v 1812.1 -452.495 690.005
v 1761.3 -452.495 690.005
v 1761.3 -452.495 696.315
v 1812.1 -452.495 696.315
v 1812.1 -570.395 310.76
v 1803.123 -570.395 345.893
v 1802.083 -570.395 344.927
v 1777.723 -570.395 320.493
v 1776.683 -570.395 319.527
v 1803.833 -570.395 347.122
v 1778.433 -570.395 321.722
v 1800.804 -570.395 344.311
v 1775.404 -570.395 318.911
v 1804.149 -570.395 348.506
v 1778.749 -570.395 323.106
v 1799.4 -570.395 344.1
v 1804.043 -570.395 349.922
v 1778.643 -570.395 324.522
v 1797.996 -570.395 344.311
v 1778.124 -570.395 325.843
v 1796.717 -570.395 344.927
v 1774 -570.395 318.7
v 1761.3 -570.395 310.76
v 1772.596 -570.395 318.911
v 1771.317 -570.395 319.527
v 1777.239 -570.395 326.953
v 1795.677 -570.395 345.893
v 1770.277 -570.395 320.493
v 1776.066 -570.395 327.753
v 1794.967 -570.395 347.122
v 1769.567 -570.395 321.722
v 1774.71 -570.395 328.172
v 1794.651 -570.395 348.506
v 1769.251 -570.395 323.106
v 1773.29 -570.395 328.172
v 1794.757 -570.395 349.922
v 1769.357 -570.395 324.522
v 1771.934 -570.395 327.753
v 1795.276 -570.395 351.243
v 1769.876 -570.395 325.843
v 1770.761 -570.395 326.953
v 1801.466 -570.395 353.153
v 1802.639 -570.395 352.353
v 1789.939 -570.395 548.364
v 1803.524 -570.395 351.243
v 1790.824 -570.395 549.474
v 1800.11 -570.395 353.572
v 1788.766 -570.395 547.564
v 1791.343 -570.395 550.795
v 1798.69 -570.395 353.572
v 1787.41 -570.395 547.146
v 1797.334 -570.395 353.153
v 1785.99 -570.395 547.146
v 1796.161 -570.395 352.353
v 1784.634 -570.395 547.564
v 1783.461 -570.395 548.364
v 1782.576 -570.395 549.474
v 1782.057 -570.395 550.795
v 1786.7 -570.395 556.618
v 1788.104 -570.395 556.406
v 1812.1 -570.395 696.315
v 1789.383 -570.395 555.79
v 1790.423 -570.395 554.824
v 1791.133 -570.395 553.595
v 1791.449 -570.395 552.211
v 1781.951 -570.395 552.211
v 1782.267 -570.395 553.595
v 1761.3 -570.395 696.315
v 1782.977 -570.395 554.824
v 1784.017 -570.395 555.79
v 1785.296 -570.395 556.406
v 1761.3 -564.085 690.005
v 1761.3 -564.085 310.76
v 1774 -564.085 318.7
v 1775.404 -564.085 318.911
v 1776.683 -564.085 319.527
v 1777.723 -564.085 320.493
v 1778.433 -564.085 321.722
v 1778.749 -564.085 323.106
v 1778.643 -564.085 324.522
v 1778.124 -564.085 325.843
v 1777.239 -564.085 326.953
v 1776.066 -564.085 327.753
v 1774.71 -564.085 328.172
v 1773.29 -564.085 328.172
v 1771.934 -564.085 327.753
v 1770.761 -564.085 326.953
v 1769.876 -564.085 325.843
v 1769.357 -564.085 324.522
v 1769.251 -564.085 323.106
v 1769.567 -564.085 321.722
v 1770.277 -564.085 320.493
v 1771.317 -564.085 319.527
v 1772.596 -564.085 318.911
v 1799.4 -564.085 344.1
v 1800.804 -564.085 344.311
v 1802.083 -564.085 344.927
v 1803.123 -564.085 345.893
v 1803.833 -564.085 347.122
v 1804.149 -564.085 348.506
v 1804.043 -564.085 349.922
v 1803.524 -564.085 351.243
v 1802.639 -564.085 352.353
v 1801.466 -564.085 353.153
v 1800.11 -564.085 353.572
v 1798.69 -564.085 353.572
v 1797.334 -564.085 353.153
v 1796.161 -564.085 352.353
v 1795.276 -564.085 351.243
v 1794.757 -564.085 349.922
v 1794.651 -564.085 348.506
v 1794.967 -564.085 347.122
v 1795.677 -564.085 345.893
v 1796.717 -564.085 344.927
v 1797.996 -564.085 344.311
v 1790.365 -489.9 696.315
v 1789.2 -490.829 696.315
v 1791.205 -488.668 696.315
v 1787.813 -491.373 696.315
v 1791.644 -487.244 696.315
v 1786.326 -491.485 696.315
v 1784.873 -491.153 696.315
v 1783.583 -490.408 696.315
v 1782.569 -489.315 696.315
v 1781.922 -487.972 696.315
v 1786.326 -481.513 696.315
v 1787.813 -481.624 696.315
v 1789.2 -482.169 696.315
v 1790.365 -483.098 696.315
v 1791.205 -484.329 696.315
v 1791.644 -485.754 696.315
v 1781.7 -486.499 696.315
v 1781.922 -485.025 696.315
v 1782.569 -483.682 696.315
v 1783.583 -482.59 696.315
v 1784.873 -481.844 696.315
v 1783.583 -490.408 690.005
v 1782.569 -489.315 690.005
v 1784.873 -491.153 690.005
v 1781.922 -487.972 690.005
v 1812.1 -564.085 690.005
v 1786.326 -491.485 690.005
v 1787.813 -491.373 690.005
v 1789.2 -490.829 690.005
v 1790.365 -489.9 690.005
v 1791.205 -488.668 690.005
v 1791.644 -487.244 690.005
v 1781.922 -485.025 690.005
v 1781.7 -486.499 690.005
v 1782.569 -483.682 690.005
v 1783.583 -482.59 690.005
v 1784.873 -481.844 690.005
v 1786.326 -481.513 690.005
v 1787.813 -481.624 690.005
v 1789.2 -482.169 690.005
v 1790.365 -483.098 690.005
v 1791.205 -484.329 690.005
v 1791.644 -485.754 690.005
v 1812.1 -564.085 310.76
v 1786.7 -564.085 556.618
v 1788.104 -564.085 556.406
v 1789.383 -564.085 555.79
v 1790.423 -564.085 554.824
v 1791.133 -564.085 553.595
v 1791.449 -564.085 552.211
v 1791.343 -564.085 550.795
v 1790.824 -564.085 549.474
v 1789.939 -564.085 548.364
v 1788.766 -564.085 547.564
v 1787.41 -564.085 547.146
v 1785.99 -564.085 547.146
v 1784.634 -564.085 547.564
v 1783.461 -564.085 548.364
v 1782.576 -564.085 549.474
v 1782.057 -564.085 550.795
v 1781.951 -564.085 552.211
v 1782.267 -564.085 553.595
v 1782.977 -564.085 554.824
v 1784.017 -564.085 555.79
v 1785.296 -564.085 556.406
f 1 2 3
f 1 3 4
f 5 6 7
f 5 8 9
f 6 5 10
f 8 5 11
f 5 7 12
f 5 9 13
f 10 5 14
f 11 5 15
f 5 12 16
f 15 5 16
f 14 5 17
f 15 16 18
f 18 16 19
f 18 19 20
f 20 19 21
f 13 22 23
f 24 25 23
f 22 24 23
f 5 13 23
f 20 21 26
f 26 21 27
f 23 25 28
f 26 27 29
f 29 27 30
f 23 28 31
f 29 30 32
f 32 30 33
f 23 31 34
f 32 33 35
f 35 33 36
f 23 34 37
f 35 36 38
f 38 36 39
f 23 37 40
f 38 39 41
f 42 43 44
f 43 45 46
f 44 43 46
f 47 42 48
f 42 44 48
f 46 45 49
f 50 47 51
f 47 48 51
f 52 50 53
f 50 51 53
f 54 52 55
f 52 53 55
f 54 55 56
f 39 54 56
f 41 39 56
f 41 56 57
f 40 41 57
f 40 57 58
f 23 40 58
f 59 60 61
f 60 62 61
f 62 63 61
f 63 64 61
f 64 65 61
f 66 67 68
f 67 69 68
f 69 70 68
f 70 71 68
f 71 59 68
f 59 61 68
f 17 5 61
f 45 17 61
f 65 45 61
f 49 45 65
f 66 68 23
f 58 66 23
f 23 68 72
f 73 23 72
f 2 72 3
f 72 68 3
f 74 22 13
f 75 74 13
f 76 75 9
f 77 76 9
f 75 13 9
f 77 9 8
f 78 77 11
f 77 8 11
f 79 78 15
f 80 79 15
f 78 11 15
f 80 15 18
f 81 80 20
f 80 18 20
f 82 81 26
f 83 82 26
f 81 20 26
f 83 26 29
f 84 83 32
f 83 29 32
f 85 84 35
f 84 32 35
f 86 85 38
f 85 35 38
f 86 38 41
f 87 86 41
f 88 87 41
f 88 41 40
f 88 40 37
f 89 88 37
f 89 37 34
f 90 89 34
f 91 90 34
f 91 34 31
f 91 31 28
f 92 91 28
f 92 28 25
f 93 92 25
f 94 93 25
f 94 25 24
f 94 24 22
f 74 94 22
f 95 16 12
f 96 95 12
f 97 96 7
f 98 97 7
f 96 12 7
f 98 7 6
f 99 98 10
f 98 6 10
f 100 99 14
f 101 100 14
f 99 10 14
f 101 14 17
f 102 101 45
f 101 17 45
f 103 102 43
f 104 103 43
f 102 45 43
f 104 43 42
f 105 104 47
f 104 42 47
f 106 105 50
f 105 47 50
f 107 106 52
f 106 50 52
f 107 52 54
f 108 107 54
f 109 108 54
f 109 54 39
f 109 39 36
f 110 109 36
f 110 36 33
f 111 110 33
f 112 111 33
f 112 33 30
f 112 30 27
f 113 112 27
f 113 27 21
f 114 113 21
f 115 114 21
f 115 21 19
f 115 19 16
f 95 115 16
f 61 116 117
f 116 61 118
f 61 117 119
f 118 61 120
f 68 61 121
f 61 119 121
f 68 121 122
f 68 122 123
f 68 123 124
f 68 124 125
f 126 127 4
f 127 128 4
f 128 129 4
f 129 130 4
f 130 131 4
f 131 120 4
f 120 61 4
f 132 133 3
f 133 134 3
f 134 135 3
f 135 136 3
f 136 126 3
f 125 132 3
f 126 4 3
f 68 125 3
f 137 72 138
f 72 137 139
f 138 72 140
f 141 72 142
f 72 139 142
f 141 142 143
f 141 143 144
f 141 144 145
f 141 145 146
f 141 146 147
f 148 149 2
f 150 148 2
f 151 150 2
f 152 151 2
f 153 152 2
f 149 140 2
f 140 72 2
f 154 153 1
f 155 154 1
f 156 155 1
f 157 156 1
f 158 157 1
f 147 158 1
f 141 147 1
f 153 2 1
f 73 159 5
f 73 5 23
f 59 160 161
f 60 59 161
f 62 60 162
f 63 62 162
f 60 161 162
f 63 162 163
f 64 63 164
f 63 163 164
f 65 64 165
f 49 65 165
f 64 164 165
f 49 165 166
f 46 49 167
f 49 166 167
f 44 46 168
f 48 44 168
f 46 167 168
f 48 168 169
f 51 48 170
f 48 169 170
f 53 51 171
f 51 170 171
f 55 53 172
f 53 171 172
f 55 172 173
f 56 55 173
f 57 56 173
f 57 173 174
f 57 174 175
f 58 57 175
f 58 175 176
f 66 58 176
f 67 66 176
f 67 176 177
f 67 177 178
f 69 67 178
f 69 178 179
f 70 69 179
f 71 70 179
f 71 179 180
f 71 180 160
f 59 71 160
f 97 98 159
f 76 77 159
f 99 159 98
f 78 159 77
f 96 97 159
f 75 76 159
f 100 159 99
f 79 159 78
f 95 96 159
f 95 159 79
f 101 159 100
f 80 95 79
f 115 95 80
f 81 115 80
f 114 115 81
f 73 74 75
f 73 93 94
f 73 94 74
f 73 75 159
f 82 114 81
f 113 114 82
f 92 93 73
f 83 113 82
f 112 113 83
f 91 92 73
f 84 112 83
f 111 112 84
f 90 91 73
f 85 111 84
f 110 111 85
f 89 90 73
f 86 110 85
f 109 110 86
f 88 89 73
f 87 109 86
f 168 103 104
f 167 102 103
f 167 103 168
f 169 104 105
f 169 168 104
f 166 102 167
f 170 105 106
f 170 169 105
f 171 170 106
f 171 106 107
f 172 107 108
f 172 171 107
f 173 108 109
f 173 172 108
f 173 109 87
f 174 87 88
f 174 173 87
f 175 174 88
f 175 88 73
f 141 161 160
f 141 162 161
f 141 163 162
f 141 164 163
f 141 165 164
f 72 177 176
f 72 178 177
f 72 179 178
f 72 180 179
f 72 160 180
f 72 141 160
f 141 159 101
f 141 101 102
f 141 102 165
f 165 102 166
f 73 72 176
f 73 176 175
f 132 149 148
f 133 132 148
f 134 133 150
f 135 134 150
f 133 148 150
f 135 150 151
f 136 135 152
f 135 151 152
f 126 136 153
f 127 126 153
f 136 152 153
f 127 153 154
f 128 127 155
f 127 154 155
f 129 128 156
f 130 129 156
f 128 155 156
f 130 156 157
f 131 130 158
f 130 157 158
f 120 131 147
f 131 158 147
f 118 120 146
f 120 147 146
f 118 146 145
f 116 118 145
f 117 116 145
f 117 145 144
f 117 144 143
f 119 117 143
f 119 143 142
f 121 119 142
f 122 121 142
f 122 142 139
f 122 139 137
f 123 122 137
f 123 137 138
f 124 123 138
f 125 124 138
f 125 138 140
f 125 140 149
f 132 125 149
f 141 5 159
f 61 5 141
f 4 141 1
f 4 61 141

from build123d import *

# Parameters (mm, degrees)
CROQUIS2_W              = 50.8
CROQUIS2_H              = 6.31
CROQUIS3_W              = 50.8
CROQUIS3_H              = 6.31
CROQUIS4_W              = 60
CROQUIS4_H              = 53.155
SALIENTE_EXTRUIR1_DEPTH = 6.31
CROQUIS5_W              = 60
CROQUIS5_H              = 6.31
CORTAR_EXTRUIR1_DEPTH   = 6.31
CORTAR_EXTRUIR2_DEPTH   = 634
CROQUIS8_W              = 50.8
CROQUIS8_H              = 6.31
SALIENTE_EXTRUIR2_DEPTH = 63.5
CROQUIS9_R              = 5
CORTAR_EXTRUIR3_DEPTH   = 10
CROQUIS10_W             = 790.847933
CROQUIS10_H             = 6.31
CORTAR_EXTRUIR4_DEPTH   = 286
CROQUIS11_W             = 50.8
CROQUIS11_H             = 6.31
CROQUIS11_W_2           = 210
CORTAR_EXTRUIR5_DEPTH   = 13.11
CROQUIS12_W             = 50.8
CROQUIS12_H             = 6.31
SALIENTE_EXTRUIR3_DEPTH = 6.35
CROQUIS13_W             = 50.8
CROQUIS13_H             = 6.35
CORTAR_EXTRUIR6_DEPTH   = 6.35
CROQUIS14_W             = 260.8
CROQUIS14_H             = 6.31
CORTAR_EXTRUIR7_DEPTH   = 6.31
CROQUIS15_W             = 50.8
CROQUIS15_H             = 6.31
CORTAR_EXTRUIR8_DEPTH   = 6.31
CROQUIS16_W             = 78.776397836
CROQUIS16_H             = 454.479218284
CORTAR_EXTRUIR9_DEPTH   = 128
CROQUIS22_R             = 4.7625
CORTAR_EXTRUIR15_DEPTH  = 33
CROQUIS24_R             = 5.000000022
CORTAR_EXTRUIR18_DEPTH  = 33
CROQUIS25_R             = 4.7625
CORTAR_EXTRUIR19_DEPTH  = 50


with BuildPart() as part:
    # Barrer1: sweep along a curve in space
    with BuildLine() as barrer1_path:
        Line((0, 0, 0), (0, -567.24, 0))
        Line((0, -567.24, 0), (0, -567.24, 336.2))
        Line((0, -567.24, 336.2), (1786.7, -567.24, 336.2))
        Line((1786.7, -567.24, 336.2), (1786.7, -567.24, 693.16))
        Line((1786.7, -567.24, 693.16), (1786.7, -436.23, 693.16))
        Line((1786.7, -436.23, 693.16), (1786.7, -436.23, 1487.162933))
    # Croquis2 → Barrer1 (sweep)
    with BuildSketch(Plane(origin=(0, 0, 0), x_dir=(1, 0, 0), z_dir=(0, 1, 0))):
        Rectangle(CROQUIS2_W, CROQUIS2_H)
        with Locations((210, 0)):
            Rectangle(CROQUIS2_W, CROQUIS2_H)
    sweep(path=barrer1_path.line, transition=Transition.RIGHT)

    # Barrer4: sweep along a curve in space
    with BuildLine() as barrer4_path:
        Line((-0.201028049, -3.155, -3.155), (-0.201028049, -3.155, -207.155))
        Line((-0.201028049, -3.155, -207.155), (-0.201028049, -53.155, -207.155))
    # Croquis3 → Barrer4 (sweep)
    with BuildSketch(Plane(origin=(0, 0, -3.155), x_dir=(-1, 0, 0), z_dir=(0, 0, -1))):
        with Locations((-210, -3.155)):
            Rectangle(CROQUIS3_W, CROQUIS3_H)
        with Locations((0, -3.155)):
            Rectangle(CROQUIS3_W, CROQUIS3_H)
    sweep(path=barrer4_path.line, transition=Transition.RIGHT)

    # Croquis4 → Saliente-Extruir1 (add)
    with BuildSketch(Plane(origin=(0, 0, -210.31), x_dir=(-1, 0, 0), z_dir=(0, 0, -1))):
        with Locations((-154.6, -26.5775)):
            Rectangle(CROQUIS4_W, CROQUIS4_H)
    extrude(amount=-SALIENTE_EXTRUIR1_DEPTH)

    # Croquis5 → Cortar-Extruir1 (cut)
    with BuildSketch(Plane.XY.offset(-204)):
        with Locations((154.6, -3.155)):
            Rectangle(CROQUIS5_W, CROQUIS5_H)
    extrude(amount=-CORTAR_EXTRUIR1_DEPTH, mode=Mode.SUBTRACT)

    # Croquis7 → Cortar-Extruir2 (cut)
    with BuildSketch(Plane(origin=(0, 0, 0), x_dir=(1, 0, 0), z_dir=(0, 1, 0))):
        Polygon((1761.3, -361.6), (2022.1, -361.6), (2022.1, 278.600557529), (-188.115947115, 278.600557529), (-188.115947115, -361.6), align=None)
    extrude(amount=-CORTAR_EXTRUIR2_DEPTH, mode=Mode.SUBTRACT)

    # Croquis8 → Saliente-Extruir2 (add)
    with BuildSketch(Plane(origin=(0, 0, 361.6), x_dir=(-1, 0, 0), z_dir=(0, 0, -1))):
        with Locations((-1786.7, -567.24)):
            Rectangle(CROQUIS8_W, CROQUIS8_H)
    extrude(amount=SALIENTE_EXTRUIR2_DEPTH)

    # Croquis9 → Cortar-Extruir3 (cut)
    with BuildSketch(Plane(origin=(0, -433.075, 0), x_dir=(1, 0, 0), z_dir=(0, 1, 0))):
        with Locations(Location((1786.7, -1454.162933, 0), (0, 0, 270))):
            Circle(CROQUIS9_R)
        with Locations(Location((1786.7, -1234.162933, 0), (0, 0, 270))):
            Circle(CROQUIS9_R)
        with Locations(Location((1996.7, -1234.162933, 0), (0, 0, 270))):
            Circle(CROQUIS9_R)
        with Locations(Location((1996.7, -1454.162933, 0), (0, 0, 270))):
            Circle(CROQUIS9_R)
    extrude(amount=-CORTAR_EXTRUIR3_DEPTH, mode=Mode.SUBTRACT)

    # Croquis10 → Cortar-Extruir4 (cut)
    with BuildSketch(Plane(origin=(2022.1, 0, 0), x_dir=(0, 0, -1), z_dir=(1, 0, 0))):
        with Locations((-1091.7389665, -436.23)):
            Rectangle(CROQUIS10_W, CROQUIS10_H)
    extrude(amount=-CORTAR_EXTRUIR4_DEPTH, mode=Mode.SUBTRACT)

    # Croquis11 → Cortar-Extruir5 (cut)
    with BuildSketch(Plane(origin=(0, -433.075, 0), x_dir=(1, 0, 0), z_dir=(0, 1, 0))):
        with Locations((1996.7, -693.16)):
            Rectangle(CROQUIS11_W, CROQUIS11_H)
        with Locations((1866.3, -693.16)):
            Rectangle(CROQUIS11_W_2, CROQUIS11_H)
    extrude(amount=-CORTAR_EXTRUIR5_DEPTH, mode=Mode.SUBTRACT)

    # Croquis12 → Saliente-Extruir3 (add)
    with BuildSketch(Plane(origin=(0, 0, 361.6), x_dir=(-1, 0, 0), z_dir=(0, 0, -1))):
        with Locations((-1996.7, -567.24)):
            Rectangle(CROQUIS12_W, CROQUIS12_H)
    extrude(amount=SALIENTE_EXTRUIR3_DEPTH)

    # Croquis13 → Cortar-Extruir6 (cut)
    with BuildSketch(Plane(origin=(0, -564.085, 0), x_dir=(1, 0, 0), z_dir=(0, 1, 0))):
        with Locations((1786.7, -301.275)):
            Rectangle(CROQUIS13_W, CROQUIS13_H)
    extrude(amount=-CORTAR_EXTRUIR6_DEPTH, mode=Mode.SUBTRACT)

    # Croquis14 → Cortar-Extruir7 (cut)
    with BuildSketch(Plane(origin=(0, -446.185, 0), x_dir=(1, 0, 0), z_dir=(0, 1, 0))):
        with Locations((1891.7, -693.16)):
            Rectangle(CROQUIS14_W, CROQUIS14_H)
    extrude(amount=-CORTAR_EXTRUIR7_DEPTH, mode=Mode.SUBTRACT)

    # Croquis15 → Cortar-Extruir8 (cut)
    with BuildSketch(Plane(origin=(0, 0, 304.45), x_dir=(-1, 0, 0), z_dir=(0, 0, -1))):
        with Locations((-1786.7, -567.24)):
            Rectangle(CROQUIS15_W, CROQUIS15_H)
    extrude(amount=-CORTAR_EXTRUIR8_DEPTH, mode=Mode.SUBTRACT)

    # Croquis16 → Cortar-Extruir9 (cut)
    with BuildSketch(Plane(origin=(0, -452.495, 0), x_dir=(1, 0, 0), z_dir=(0, 1, 0))):
        with Locations((1993.809618139, -557.908989907)):
            Rectangle(CROQUIS16_W, CROQUIS16_H)
    extrude(amount=-CORTAR_EXTRUIR9_DEPTH, mode=Mode.SUBTRACT)

    # Croquis22 → Cortar-Extruir15 (cut)
    with BuildSketch(Plane(origin=(0, -564.085, 0), x_dir=(1, 0, 0), z_dir=(0, 1, 0))):
        with Locations(Location((1786.7, -551.855, 0), (0, 0, 270))):
            Circle(CROQUIS22_R)
    extrude(amount=-CORTAR_EXTRUIR15_DEPTH, mode=Mode.SUBTRACT)

    # Croquis24 → Cortar-Extruir18 (cut)
    with BuildSketch(Plane(origin=(0, 0, 690.005), x_dir=(-1, 0, 0), z_dir=(0, 0, -1))):
        with Locations((-1786.700000078, -486.49871274)):
            Circle(CROQUIS24_R)
    extrude(amount=-CORTAR_EXTRUIR18_DEPTH, mode=Mode.SUBTRACT)

    # Croquis25 → Cortar-Extruir19 (cut)
    with BuildSketch(Plane(origin=(0, -570.395, 0), x_dir=(-1, 0, 0), z_dir=(0, -1, 0))):
        with Locations(Location((-1799.399999999, -348.862204666, 0), (0, 0, 90))):
            Circle(CROQUIS25_R)
        with Locations(Location((-1773.999999999, -323.462204666, 0), (0, 0, 90))):
            Circle(CROQUIS25_R)
    extrude(amount=-CORTAR_EXTRUIR19_DEPTH, mode=Mode.SUBTRACT)


solid = part.part
